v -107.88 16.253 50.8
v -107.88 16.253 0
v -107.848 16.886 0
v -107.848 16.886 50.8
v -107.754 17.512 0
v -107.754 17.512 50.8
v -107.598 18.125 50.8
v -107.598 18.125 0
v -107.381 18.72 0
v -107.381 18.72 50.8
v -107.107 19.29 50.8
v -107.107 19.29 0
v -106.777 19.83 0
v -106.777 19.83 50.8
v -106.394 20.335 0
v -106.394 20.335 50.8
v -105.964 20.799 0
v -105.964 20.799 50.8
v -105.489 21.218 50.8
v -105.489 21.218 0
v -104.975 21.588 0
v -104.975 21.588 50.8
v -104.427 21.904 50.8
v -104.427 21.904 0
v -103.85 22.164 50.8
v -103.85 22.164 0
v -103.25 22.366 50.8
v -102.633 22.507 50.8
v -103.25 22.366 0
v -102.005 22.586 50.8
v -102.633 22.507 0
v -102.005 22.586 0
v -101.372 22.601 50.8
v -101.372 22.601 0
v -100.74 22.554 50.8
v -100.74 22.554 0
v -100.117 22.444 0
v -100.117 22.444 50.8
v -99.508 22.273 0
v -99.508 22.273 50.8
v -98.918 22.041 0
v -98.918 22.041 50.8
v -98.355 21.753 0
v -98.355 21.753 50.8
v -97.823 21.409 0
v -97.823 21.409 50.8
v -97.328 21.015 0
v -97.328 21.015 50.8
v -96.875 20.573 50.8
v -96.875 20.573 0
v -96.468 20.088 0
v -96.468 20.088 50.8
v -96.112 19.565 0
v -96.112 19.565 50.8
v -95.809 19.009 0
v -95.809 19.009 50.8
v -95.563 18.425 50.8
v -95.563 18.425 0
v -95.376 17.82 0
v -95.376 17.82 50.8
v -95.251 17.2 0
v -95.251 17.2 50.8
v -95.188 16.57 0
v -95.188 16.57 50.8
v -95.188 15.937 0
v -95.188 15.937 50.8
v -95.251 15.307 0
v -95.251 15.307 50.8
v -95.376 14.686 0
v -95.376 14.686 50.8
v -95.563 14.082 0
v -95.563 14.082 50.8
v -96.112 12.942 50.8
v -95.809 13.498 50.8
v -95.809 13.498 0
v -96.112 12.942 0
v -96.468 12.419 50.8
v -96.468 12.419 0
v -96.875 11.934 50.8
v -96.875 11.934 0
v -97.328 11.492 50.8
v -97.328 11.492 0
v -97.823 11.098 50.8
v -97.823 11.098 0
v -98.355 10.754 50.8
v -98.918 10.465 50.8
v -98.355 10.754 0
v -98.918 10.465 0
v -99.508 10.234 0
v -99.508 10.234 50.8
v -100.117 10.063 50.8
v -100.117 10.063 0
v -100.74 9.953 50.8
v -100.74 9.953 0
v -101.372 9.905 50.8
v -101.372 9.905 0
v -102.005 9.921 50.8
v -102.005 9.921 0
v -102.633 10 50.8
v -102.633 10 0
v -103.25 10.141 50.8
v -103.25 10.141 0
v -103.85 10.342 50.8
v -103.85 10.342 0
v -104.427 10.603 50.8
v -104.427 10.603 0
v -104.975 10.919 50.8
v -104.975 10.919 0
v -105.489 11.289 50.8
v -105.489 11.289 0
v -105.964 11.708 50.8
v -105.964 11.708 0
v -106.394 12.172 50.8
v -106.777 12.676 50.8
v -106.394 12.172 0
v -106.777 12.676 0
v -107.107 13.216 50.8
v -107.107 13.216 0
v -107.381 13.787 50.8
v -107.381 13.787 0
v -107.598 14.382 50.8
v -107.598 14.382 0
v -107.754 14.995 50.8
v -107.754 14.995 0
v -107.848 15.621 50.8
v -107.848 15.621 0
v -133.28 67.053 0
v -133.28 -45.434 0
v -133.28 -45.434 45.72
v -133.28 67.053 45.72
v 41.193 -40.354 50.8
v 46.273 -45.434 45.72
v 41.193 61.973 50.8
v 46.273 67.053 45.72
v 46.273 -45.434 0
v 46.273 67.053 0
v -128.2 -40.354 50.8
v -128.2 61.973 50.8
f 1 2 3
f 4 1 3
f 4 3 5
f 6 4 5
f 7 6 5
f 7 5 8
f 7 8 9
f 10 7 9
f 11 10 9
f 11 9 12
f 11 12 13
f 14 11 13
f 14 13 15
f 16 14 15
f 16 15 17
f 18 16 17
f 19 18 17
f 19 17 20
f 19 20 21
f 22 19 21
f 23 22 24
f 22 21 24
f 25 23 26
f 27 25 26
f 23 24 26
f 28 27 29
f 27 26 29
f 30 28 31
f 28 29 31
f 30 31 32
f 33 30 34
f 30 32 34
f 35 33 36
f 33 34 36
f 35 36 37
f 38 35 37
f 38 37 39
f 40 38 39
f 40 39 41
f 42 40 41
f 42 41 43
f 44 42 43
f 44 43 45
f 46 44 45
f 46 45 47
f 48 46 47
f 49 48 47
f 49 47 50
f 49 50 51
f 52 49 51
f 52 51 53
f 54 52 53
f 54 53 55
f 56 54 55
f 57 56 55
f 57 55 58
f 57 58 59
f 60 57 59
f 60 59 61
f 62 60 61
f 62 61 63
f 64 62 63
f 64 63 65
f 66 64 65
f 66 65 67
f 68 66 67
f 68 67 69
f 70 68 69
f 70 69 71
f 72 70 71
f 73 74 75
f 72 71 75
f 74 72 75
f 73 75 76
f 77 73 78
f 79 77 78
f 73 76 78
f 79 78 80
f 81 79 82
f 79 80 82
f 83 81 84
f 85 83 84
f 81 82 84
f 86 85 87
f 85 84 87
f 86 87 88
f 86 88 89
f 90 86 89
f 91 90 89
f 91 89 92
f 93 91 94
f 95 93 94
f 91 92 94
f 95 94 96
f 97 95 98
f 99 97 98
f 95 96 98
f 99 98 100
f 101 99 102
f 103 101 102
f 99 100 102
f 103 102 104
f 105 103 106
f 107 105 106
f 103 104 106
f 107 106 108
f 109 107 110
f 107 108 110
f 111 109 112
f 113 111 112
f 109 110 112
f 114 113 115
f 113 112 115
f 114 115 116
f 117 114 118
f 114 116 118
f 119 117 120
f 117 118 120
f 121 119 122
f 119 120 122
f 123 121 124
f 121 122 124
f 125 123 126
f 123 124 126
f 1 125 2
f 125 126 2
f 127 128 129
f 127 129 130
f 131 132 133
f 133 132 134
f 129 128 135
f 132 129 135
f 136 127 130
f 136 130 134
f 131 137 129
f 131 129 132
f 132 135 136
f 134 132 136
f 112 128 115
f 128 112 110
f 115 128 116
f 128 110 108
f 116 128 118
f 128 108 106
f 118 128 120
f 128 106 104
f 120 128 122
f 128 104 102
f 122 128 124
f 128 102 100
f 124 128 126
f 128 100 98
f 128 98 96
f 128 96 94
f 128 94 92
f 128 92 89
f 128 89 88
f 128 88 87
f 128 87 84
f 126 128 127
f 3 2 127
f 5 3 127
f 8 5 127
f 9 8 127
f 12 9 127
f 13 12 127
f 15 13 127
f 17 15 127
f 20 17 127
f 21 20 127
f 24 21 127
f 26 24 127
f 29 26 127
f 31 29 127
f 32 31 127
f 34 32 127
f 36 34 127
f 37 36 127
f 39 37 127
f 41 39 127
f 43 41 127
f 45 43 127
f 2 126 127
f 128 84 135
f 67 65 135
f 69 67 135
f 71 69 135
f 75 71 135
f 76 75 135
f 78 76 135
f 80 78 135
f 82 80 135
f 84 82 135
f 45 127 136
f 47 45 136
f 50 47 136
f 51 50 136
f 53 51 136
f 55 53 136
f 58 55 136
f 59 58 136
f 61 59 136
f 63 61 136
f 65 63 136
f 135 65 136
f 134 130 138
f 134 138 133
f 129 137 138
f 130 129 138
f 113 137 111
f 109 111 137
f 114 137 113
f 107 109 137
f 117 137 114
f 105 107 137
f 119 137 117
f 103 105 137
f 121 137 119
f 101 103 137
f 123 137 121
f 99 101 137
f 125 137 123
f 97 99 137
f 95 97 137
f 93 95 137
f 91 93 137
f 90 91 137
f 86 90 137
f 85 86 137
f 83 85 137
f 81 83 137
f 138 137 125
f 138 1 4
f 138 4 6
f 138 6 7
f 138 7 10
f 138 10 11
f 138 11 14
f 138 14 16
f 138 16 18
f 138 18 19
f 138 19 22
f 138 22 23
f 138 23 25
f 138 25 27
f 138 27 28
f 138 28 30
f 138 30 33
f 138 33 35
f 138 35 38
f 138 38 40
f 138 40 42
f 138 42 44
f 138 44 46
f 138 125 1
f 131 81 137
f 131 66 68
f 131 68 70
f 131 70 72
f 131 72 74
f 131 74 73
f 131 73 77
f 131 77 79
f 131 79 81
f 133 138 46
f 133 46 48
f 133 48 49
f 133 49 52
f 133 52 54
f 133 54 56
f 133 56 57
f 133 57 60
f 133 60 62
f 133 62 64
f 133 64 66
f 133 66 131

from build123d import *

# Parameters (mm, degrees)
F0_W     = 179.552953
F0_H     = 112.487468
F1_DEPTH = 50.8
F3_D     = 12.7
F4_SIZE  = 5.08
F5_SIZE  = 5.08


with BuildPart() as f1:
    # F0 (on Top) → F1 (new body)
    with BuildSketch(Plane.XY):
        with Locations((-43.503502, 10.809673)):
            Rectangle(F0_W, F0_H)
    extrude(amount=F1_DEPTH)

    # F3 (through all)
    with Locations(Plane.XY.offset(50.8)):
        with Locations((-101.529979, 16.253407)):
            Hole(F3_D / 2)

    # F4
    f4_edges = [f1.edges().sort_by_distance(p)[0] for p in [
        (-43.503502, -45.434061, 50.8),
    ]]
    chamfer(f4_edges, length=F4_SIZE)

    # F5
    f5_edges = [f1.edges().sort_by_distance(p)[0] for p in [
        (46.272974, 13.349673, 50.8),
        (-43.503502, 67.053407, 50.8),
        (-133.279979, 13.349673, 50.8),
    ]]
    chamfer(f5_edges, length=F5_SIZE)


solid = f1.part
